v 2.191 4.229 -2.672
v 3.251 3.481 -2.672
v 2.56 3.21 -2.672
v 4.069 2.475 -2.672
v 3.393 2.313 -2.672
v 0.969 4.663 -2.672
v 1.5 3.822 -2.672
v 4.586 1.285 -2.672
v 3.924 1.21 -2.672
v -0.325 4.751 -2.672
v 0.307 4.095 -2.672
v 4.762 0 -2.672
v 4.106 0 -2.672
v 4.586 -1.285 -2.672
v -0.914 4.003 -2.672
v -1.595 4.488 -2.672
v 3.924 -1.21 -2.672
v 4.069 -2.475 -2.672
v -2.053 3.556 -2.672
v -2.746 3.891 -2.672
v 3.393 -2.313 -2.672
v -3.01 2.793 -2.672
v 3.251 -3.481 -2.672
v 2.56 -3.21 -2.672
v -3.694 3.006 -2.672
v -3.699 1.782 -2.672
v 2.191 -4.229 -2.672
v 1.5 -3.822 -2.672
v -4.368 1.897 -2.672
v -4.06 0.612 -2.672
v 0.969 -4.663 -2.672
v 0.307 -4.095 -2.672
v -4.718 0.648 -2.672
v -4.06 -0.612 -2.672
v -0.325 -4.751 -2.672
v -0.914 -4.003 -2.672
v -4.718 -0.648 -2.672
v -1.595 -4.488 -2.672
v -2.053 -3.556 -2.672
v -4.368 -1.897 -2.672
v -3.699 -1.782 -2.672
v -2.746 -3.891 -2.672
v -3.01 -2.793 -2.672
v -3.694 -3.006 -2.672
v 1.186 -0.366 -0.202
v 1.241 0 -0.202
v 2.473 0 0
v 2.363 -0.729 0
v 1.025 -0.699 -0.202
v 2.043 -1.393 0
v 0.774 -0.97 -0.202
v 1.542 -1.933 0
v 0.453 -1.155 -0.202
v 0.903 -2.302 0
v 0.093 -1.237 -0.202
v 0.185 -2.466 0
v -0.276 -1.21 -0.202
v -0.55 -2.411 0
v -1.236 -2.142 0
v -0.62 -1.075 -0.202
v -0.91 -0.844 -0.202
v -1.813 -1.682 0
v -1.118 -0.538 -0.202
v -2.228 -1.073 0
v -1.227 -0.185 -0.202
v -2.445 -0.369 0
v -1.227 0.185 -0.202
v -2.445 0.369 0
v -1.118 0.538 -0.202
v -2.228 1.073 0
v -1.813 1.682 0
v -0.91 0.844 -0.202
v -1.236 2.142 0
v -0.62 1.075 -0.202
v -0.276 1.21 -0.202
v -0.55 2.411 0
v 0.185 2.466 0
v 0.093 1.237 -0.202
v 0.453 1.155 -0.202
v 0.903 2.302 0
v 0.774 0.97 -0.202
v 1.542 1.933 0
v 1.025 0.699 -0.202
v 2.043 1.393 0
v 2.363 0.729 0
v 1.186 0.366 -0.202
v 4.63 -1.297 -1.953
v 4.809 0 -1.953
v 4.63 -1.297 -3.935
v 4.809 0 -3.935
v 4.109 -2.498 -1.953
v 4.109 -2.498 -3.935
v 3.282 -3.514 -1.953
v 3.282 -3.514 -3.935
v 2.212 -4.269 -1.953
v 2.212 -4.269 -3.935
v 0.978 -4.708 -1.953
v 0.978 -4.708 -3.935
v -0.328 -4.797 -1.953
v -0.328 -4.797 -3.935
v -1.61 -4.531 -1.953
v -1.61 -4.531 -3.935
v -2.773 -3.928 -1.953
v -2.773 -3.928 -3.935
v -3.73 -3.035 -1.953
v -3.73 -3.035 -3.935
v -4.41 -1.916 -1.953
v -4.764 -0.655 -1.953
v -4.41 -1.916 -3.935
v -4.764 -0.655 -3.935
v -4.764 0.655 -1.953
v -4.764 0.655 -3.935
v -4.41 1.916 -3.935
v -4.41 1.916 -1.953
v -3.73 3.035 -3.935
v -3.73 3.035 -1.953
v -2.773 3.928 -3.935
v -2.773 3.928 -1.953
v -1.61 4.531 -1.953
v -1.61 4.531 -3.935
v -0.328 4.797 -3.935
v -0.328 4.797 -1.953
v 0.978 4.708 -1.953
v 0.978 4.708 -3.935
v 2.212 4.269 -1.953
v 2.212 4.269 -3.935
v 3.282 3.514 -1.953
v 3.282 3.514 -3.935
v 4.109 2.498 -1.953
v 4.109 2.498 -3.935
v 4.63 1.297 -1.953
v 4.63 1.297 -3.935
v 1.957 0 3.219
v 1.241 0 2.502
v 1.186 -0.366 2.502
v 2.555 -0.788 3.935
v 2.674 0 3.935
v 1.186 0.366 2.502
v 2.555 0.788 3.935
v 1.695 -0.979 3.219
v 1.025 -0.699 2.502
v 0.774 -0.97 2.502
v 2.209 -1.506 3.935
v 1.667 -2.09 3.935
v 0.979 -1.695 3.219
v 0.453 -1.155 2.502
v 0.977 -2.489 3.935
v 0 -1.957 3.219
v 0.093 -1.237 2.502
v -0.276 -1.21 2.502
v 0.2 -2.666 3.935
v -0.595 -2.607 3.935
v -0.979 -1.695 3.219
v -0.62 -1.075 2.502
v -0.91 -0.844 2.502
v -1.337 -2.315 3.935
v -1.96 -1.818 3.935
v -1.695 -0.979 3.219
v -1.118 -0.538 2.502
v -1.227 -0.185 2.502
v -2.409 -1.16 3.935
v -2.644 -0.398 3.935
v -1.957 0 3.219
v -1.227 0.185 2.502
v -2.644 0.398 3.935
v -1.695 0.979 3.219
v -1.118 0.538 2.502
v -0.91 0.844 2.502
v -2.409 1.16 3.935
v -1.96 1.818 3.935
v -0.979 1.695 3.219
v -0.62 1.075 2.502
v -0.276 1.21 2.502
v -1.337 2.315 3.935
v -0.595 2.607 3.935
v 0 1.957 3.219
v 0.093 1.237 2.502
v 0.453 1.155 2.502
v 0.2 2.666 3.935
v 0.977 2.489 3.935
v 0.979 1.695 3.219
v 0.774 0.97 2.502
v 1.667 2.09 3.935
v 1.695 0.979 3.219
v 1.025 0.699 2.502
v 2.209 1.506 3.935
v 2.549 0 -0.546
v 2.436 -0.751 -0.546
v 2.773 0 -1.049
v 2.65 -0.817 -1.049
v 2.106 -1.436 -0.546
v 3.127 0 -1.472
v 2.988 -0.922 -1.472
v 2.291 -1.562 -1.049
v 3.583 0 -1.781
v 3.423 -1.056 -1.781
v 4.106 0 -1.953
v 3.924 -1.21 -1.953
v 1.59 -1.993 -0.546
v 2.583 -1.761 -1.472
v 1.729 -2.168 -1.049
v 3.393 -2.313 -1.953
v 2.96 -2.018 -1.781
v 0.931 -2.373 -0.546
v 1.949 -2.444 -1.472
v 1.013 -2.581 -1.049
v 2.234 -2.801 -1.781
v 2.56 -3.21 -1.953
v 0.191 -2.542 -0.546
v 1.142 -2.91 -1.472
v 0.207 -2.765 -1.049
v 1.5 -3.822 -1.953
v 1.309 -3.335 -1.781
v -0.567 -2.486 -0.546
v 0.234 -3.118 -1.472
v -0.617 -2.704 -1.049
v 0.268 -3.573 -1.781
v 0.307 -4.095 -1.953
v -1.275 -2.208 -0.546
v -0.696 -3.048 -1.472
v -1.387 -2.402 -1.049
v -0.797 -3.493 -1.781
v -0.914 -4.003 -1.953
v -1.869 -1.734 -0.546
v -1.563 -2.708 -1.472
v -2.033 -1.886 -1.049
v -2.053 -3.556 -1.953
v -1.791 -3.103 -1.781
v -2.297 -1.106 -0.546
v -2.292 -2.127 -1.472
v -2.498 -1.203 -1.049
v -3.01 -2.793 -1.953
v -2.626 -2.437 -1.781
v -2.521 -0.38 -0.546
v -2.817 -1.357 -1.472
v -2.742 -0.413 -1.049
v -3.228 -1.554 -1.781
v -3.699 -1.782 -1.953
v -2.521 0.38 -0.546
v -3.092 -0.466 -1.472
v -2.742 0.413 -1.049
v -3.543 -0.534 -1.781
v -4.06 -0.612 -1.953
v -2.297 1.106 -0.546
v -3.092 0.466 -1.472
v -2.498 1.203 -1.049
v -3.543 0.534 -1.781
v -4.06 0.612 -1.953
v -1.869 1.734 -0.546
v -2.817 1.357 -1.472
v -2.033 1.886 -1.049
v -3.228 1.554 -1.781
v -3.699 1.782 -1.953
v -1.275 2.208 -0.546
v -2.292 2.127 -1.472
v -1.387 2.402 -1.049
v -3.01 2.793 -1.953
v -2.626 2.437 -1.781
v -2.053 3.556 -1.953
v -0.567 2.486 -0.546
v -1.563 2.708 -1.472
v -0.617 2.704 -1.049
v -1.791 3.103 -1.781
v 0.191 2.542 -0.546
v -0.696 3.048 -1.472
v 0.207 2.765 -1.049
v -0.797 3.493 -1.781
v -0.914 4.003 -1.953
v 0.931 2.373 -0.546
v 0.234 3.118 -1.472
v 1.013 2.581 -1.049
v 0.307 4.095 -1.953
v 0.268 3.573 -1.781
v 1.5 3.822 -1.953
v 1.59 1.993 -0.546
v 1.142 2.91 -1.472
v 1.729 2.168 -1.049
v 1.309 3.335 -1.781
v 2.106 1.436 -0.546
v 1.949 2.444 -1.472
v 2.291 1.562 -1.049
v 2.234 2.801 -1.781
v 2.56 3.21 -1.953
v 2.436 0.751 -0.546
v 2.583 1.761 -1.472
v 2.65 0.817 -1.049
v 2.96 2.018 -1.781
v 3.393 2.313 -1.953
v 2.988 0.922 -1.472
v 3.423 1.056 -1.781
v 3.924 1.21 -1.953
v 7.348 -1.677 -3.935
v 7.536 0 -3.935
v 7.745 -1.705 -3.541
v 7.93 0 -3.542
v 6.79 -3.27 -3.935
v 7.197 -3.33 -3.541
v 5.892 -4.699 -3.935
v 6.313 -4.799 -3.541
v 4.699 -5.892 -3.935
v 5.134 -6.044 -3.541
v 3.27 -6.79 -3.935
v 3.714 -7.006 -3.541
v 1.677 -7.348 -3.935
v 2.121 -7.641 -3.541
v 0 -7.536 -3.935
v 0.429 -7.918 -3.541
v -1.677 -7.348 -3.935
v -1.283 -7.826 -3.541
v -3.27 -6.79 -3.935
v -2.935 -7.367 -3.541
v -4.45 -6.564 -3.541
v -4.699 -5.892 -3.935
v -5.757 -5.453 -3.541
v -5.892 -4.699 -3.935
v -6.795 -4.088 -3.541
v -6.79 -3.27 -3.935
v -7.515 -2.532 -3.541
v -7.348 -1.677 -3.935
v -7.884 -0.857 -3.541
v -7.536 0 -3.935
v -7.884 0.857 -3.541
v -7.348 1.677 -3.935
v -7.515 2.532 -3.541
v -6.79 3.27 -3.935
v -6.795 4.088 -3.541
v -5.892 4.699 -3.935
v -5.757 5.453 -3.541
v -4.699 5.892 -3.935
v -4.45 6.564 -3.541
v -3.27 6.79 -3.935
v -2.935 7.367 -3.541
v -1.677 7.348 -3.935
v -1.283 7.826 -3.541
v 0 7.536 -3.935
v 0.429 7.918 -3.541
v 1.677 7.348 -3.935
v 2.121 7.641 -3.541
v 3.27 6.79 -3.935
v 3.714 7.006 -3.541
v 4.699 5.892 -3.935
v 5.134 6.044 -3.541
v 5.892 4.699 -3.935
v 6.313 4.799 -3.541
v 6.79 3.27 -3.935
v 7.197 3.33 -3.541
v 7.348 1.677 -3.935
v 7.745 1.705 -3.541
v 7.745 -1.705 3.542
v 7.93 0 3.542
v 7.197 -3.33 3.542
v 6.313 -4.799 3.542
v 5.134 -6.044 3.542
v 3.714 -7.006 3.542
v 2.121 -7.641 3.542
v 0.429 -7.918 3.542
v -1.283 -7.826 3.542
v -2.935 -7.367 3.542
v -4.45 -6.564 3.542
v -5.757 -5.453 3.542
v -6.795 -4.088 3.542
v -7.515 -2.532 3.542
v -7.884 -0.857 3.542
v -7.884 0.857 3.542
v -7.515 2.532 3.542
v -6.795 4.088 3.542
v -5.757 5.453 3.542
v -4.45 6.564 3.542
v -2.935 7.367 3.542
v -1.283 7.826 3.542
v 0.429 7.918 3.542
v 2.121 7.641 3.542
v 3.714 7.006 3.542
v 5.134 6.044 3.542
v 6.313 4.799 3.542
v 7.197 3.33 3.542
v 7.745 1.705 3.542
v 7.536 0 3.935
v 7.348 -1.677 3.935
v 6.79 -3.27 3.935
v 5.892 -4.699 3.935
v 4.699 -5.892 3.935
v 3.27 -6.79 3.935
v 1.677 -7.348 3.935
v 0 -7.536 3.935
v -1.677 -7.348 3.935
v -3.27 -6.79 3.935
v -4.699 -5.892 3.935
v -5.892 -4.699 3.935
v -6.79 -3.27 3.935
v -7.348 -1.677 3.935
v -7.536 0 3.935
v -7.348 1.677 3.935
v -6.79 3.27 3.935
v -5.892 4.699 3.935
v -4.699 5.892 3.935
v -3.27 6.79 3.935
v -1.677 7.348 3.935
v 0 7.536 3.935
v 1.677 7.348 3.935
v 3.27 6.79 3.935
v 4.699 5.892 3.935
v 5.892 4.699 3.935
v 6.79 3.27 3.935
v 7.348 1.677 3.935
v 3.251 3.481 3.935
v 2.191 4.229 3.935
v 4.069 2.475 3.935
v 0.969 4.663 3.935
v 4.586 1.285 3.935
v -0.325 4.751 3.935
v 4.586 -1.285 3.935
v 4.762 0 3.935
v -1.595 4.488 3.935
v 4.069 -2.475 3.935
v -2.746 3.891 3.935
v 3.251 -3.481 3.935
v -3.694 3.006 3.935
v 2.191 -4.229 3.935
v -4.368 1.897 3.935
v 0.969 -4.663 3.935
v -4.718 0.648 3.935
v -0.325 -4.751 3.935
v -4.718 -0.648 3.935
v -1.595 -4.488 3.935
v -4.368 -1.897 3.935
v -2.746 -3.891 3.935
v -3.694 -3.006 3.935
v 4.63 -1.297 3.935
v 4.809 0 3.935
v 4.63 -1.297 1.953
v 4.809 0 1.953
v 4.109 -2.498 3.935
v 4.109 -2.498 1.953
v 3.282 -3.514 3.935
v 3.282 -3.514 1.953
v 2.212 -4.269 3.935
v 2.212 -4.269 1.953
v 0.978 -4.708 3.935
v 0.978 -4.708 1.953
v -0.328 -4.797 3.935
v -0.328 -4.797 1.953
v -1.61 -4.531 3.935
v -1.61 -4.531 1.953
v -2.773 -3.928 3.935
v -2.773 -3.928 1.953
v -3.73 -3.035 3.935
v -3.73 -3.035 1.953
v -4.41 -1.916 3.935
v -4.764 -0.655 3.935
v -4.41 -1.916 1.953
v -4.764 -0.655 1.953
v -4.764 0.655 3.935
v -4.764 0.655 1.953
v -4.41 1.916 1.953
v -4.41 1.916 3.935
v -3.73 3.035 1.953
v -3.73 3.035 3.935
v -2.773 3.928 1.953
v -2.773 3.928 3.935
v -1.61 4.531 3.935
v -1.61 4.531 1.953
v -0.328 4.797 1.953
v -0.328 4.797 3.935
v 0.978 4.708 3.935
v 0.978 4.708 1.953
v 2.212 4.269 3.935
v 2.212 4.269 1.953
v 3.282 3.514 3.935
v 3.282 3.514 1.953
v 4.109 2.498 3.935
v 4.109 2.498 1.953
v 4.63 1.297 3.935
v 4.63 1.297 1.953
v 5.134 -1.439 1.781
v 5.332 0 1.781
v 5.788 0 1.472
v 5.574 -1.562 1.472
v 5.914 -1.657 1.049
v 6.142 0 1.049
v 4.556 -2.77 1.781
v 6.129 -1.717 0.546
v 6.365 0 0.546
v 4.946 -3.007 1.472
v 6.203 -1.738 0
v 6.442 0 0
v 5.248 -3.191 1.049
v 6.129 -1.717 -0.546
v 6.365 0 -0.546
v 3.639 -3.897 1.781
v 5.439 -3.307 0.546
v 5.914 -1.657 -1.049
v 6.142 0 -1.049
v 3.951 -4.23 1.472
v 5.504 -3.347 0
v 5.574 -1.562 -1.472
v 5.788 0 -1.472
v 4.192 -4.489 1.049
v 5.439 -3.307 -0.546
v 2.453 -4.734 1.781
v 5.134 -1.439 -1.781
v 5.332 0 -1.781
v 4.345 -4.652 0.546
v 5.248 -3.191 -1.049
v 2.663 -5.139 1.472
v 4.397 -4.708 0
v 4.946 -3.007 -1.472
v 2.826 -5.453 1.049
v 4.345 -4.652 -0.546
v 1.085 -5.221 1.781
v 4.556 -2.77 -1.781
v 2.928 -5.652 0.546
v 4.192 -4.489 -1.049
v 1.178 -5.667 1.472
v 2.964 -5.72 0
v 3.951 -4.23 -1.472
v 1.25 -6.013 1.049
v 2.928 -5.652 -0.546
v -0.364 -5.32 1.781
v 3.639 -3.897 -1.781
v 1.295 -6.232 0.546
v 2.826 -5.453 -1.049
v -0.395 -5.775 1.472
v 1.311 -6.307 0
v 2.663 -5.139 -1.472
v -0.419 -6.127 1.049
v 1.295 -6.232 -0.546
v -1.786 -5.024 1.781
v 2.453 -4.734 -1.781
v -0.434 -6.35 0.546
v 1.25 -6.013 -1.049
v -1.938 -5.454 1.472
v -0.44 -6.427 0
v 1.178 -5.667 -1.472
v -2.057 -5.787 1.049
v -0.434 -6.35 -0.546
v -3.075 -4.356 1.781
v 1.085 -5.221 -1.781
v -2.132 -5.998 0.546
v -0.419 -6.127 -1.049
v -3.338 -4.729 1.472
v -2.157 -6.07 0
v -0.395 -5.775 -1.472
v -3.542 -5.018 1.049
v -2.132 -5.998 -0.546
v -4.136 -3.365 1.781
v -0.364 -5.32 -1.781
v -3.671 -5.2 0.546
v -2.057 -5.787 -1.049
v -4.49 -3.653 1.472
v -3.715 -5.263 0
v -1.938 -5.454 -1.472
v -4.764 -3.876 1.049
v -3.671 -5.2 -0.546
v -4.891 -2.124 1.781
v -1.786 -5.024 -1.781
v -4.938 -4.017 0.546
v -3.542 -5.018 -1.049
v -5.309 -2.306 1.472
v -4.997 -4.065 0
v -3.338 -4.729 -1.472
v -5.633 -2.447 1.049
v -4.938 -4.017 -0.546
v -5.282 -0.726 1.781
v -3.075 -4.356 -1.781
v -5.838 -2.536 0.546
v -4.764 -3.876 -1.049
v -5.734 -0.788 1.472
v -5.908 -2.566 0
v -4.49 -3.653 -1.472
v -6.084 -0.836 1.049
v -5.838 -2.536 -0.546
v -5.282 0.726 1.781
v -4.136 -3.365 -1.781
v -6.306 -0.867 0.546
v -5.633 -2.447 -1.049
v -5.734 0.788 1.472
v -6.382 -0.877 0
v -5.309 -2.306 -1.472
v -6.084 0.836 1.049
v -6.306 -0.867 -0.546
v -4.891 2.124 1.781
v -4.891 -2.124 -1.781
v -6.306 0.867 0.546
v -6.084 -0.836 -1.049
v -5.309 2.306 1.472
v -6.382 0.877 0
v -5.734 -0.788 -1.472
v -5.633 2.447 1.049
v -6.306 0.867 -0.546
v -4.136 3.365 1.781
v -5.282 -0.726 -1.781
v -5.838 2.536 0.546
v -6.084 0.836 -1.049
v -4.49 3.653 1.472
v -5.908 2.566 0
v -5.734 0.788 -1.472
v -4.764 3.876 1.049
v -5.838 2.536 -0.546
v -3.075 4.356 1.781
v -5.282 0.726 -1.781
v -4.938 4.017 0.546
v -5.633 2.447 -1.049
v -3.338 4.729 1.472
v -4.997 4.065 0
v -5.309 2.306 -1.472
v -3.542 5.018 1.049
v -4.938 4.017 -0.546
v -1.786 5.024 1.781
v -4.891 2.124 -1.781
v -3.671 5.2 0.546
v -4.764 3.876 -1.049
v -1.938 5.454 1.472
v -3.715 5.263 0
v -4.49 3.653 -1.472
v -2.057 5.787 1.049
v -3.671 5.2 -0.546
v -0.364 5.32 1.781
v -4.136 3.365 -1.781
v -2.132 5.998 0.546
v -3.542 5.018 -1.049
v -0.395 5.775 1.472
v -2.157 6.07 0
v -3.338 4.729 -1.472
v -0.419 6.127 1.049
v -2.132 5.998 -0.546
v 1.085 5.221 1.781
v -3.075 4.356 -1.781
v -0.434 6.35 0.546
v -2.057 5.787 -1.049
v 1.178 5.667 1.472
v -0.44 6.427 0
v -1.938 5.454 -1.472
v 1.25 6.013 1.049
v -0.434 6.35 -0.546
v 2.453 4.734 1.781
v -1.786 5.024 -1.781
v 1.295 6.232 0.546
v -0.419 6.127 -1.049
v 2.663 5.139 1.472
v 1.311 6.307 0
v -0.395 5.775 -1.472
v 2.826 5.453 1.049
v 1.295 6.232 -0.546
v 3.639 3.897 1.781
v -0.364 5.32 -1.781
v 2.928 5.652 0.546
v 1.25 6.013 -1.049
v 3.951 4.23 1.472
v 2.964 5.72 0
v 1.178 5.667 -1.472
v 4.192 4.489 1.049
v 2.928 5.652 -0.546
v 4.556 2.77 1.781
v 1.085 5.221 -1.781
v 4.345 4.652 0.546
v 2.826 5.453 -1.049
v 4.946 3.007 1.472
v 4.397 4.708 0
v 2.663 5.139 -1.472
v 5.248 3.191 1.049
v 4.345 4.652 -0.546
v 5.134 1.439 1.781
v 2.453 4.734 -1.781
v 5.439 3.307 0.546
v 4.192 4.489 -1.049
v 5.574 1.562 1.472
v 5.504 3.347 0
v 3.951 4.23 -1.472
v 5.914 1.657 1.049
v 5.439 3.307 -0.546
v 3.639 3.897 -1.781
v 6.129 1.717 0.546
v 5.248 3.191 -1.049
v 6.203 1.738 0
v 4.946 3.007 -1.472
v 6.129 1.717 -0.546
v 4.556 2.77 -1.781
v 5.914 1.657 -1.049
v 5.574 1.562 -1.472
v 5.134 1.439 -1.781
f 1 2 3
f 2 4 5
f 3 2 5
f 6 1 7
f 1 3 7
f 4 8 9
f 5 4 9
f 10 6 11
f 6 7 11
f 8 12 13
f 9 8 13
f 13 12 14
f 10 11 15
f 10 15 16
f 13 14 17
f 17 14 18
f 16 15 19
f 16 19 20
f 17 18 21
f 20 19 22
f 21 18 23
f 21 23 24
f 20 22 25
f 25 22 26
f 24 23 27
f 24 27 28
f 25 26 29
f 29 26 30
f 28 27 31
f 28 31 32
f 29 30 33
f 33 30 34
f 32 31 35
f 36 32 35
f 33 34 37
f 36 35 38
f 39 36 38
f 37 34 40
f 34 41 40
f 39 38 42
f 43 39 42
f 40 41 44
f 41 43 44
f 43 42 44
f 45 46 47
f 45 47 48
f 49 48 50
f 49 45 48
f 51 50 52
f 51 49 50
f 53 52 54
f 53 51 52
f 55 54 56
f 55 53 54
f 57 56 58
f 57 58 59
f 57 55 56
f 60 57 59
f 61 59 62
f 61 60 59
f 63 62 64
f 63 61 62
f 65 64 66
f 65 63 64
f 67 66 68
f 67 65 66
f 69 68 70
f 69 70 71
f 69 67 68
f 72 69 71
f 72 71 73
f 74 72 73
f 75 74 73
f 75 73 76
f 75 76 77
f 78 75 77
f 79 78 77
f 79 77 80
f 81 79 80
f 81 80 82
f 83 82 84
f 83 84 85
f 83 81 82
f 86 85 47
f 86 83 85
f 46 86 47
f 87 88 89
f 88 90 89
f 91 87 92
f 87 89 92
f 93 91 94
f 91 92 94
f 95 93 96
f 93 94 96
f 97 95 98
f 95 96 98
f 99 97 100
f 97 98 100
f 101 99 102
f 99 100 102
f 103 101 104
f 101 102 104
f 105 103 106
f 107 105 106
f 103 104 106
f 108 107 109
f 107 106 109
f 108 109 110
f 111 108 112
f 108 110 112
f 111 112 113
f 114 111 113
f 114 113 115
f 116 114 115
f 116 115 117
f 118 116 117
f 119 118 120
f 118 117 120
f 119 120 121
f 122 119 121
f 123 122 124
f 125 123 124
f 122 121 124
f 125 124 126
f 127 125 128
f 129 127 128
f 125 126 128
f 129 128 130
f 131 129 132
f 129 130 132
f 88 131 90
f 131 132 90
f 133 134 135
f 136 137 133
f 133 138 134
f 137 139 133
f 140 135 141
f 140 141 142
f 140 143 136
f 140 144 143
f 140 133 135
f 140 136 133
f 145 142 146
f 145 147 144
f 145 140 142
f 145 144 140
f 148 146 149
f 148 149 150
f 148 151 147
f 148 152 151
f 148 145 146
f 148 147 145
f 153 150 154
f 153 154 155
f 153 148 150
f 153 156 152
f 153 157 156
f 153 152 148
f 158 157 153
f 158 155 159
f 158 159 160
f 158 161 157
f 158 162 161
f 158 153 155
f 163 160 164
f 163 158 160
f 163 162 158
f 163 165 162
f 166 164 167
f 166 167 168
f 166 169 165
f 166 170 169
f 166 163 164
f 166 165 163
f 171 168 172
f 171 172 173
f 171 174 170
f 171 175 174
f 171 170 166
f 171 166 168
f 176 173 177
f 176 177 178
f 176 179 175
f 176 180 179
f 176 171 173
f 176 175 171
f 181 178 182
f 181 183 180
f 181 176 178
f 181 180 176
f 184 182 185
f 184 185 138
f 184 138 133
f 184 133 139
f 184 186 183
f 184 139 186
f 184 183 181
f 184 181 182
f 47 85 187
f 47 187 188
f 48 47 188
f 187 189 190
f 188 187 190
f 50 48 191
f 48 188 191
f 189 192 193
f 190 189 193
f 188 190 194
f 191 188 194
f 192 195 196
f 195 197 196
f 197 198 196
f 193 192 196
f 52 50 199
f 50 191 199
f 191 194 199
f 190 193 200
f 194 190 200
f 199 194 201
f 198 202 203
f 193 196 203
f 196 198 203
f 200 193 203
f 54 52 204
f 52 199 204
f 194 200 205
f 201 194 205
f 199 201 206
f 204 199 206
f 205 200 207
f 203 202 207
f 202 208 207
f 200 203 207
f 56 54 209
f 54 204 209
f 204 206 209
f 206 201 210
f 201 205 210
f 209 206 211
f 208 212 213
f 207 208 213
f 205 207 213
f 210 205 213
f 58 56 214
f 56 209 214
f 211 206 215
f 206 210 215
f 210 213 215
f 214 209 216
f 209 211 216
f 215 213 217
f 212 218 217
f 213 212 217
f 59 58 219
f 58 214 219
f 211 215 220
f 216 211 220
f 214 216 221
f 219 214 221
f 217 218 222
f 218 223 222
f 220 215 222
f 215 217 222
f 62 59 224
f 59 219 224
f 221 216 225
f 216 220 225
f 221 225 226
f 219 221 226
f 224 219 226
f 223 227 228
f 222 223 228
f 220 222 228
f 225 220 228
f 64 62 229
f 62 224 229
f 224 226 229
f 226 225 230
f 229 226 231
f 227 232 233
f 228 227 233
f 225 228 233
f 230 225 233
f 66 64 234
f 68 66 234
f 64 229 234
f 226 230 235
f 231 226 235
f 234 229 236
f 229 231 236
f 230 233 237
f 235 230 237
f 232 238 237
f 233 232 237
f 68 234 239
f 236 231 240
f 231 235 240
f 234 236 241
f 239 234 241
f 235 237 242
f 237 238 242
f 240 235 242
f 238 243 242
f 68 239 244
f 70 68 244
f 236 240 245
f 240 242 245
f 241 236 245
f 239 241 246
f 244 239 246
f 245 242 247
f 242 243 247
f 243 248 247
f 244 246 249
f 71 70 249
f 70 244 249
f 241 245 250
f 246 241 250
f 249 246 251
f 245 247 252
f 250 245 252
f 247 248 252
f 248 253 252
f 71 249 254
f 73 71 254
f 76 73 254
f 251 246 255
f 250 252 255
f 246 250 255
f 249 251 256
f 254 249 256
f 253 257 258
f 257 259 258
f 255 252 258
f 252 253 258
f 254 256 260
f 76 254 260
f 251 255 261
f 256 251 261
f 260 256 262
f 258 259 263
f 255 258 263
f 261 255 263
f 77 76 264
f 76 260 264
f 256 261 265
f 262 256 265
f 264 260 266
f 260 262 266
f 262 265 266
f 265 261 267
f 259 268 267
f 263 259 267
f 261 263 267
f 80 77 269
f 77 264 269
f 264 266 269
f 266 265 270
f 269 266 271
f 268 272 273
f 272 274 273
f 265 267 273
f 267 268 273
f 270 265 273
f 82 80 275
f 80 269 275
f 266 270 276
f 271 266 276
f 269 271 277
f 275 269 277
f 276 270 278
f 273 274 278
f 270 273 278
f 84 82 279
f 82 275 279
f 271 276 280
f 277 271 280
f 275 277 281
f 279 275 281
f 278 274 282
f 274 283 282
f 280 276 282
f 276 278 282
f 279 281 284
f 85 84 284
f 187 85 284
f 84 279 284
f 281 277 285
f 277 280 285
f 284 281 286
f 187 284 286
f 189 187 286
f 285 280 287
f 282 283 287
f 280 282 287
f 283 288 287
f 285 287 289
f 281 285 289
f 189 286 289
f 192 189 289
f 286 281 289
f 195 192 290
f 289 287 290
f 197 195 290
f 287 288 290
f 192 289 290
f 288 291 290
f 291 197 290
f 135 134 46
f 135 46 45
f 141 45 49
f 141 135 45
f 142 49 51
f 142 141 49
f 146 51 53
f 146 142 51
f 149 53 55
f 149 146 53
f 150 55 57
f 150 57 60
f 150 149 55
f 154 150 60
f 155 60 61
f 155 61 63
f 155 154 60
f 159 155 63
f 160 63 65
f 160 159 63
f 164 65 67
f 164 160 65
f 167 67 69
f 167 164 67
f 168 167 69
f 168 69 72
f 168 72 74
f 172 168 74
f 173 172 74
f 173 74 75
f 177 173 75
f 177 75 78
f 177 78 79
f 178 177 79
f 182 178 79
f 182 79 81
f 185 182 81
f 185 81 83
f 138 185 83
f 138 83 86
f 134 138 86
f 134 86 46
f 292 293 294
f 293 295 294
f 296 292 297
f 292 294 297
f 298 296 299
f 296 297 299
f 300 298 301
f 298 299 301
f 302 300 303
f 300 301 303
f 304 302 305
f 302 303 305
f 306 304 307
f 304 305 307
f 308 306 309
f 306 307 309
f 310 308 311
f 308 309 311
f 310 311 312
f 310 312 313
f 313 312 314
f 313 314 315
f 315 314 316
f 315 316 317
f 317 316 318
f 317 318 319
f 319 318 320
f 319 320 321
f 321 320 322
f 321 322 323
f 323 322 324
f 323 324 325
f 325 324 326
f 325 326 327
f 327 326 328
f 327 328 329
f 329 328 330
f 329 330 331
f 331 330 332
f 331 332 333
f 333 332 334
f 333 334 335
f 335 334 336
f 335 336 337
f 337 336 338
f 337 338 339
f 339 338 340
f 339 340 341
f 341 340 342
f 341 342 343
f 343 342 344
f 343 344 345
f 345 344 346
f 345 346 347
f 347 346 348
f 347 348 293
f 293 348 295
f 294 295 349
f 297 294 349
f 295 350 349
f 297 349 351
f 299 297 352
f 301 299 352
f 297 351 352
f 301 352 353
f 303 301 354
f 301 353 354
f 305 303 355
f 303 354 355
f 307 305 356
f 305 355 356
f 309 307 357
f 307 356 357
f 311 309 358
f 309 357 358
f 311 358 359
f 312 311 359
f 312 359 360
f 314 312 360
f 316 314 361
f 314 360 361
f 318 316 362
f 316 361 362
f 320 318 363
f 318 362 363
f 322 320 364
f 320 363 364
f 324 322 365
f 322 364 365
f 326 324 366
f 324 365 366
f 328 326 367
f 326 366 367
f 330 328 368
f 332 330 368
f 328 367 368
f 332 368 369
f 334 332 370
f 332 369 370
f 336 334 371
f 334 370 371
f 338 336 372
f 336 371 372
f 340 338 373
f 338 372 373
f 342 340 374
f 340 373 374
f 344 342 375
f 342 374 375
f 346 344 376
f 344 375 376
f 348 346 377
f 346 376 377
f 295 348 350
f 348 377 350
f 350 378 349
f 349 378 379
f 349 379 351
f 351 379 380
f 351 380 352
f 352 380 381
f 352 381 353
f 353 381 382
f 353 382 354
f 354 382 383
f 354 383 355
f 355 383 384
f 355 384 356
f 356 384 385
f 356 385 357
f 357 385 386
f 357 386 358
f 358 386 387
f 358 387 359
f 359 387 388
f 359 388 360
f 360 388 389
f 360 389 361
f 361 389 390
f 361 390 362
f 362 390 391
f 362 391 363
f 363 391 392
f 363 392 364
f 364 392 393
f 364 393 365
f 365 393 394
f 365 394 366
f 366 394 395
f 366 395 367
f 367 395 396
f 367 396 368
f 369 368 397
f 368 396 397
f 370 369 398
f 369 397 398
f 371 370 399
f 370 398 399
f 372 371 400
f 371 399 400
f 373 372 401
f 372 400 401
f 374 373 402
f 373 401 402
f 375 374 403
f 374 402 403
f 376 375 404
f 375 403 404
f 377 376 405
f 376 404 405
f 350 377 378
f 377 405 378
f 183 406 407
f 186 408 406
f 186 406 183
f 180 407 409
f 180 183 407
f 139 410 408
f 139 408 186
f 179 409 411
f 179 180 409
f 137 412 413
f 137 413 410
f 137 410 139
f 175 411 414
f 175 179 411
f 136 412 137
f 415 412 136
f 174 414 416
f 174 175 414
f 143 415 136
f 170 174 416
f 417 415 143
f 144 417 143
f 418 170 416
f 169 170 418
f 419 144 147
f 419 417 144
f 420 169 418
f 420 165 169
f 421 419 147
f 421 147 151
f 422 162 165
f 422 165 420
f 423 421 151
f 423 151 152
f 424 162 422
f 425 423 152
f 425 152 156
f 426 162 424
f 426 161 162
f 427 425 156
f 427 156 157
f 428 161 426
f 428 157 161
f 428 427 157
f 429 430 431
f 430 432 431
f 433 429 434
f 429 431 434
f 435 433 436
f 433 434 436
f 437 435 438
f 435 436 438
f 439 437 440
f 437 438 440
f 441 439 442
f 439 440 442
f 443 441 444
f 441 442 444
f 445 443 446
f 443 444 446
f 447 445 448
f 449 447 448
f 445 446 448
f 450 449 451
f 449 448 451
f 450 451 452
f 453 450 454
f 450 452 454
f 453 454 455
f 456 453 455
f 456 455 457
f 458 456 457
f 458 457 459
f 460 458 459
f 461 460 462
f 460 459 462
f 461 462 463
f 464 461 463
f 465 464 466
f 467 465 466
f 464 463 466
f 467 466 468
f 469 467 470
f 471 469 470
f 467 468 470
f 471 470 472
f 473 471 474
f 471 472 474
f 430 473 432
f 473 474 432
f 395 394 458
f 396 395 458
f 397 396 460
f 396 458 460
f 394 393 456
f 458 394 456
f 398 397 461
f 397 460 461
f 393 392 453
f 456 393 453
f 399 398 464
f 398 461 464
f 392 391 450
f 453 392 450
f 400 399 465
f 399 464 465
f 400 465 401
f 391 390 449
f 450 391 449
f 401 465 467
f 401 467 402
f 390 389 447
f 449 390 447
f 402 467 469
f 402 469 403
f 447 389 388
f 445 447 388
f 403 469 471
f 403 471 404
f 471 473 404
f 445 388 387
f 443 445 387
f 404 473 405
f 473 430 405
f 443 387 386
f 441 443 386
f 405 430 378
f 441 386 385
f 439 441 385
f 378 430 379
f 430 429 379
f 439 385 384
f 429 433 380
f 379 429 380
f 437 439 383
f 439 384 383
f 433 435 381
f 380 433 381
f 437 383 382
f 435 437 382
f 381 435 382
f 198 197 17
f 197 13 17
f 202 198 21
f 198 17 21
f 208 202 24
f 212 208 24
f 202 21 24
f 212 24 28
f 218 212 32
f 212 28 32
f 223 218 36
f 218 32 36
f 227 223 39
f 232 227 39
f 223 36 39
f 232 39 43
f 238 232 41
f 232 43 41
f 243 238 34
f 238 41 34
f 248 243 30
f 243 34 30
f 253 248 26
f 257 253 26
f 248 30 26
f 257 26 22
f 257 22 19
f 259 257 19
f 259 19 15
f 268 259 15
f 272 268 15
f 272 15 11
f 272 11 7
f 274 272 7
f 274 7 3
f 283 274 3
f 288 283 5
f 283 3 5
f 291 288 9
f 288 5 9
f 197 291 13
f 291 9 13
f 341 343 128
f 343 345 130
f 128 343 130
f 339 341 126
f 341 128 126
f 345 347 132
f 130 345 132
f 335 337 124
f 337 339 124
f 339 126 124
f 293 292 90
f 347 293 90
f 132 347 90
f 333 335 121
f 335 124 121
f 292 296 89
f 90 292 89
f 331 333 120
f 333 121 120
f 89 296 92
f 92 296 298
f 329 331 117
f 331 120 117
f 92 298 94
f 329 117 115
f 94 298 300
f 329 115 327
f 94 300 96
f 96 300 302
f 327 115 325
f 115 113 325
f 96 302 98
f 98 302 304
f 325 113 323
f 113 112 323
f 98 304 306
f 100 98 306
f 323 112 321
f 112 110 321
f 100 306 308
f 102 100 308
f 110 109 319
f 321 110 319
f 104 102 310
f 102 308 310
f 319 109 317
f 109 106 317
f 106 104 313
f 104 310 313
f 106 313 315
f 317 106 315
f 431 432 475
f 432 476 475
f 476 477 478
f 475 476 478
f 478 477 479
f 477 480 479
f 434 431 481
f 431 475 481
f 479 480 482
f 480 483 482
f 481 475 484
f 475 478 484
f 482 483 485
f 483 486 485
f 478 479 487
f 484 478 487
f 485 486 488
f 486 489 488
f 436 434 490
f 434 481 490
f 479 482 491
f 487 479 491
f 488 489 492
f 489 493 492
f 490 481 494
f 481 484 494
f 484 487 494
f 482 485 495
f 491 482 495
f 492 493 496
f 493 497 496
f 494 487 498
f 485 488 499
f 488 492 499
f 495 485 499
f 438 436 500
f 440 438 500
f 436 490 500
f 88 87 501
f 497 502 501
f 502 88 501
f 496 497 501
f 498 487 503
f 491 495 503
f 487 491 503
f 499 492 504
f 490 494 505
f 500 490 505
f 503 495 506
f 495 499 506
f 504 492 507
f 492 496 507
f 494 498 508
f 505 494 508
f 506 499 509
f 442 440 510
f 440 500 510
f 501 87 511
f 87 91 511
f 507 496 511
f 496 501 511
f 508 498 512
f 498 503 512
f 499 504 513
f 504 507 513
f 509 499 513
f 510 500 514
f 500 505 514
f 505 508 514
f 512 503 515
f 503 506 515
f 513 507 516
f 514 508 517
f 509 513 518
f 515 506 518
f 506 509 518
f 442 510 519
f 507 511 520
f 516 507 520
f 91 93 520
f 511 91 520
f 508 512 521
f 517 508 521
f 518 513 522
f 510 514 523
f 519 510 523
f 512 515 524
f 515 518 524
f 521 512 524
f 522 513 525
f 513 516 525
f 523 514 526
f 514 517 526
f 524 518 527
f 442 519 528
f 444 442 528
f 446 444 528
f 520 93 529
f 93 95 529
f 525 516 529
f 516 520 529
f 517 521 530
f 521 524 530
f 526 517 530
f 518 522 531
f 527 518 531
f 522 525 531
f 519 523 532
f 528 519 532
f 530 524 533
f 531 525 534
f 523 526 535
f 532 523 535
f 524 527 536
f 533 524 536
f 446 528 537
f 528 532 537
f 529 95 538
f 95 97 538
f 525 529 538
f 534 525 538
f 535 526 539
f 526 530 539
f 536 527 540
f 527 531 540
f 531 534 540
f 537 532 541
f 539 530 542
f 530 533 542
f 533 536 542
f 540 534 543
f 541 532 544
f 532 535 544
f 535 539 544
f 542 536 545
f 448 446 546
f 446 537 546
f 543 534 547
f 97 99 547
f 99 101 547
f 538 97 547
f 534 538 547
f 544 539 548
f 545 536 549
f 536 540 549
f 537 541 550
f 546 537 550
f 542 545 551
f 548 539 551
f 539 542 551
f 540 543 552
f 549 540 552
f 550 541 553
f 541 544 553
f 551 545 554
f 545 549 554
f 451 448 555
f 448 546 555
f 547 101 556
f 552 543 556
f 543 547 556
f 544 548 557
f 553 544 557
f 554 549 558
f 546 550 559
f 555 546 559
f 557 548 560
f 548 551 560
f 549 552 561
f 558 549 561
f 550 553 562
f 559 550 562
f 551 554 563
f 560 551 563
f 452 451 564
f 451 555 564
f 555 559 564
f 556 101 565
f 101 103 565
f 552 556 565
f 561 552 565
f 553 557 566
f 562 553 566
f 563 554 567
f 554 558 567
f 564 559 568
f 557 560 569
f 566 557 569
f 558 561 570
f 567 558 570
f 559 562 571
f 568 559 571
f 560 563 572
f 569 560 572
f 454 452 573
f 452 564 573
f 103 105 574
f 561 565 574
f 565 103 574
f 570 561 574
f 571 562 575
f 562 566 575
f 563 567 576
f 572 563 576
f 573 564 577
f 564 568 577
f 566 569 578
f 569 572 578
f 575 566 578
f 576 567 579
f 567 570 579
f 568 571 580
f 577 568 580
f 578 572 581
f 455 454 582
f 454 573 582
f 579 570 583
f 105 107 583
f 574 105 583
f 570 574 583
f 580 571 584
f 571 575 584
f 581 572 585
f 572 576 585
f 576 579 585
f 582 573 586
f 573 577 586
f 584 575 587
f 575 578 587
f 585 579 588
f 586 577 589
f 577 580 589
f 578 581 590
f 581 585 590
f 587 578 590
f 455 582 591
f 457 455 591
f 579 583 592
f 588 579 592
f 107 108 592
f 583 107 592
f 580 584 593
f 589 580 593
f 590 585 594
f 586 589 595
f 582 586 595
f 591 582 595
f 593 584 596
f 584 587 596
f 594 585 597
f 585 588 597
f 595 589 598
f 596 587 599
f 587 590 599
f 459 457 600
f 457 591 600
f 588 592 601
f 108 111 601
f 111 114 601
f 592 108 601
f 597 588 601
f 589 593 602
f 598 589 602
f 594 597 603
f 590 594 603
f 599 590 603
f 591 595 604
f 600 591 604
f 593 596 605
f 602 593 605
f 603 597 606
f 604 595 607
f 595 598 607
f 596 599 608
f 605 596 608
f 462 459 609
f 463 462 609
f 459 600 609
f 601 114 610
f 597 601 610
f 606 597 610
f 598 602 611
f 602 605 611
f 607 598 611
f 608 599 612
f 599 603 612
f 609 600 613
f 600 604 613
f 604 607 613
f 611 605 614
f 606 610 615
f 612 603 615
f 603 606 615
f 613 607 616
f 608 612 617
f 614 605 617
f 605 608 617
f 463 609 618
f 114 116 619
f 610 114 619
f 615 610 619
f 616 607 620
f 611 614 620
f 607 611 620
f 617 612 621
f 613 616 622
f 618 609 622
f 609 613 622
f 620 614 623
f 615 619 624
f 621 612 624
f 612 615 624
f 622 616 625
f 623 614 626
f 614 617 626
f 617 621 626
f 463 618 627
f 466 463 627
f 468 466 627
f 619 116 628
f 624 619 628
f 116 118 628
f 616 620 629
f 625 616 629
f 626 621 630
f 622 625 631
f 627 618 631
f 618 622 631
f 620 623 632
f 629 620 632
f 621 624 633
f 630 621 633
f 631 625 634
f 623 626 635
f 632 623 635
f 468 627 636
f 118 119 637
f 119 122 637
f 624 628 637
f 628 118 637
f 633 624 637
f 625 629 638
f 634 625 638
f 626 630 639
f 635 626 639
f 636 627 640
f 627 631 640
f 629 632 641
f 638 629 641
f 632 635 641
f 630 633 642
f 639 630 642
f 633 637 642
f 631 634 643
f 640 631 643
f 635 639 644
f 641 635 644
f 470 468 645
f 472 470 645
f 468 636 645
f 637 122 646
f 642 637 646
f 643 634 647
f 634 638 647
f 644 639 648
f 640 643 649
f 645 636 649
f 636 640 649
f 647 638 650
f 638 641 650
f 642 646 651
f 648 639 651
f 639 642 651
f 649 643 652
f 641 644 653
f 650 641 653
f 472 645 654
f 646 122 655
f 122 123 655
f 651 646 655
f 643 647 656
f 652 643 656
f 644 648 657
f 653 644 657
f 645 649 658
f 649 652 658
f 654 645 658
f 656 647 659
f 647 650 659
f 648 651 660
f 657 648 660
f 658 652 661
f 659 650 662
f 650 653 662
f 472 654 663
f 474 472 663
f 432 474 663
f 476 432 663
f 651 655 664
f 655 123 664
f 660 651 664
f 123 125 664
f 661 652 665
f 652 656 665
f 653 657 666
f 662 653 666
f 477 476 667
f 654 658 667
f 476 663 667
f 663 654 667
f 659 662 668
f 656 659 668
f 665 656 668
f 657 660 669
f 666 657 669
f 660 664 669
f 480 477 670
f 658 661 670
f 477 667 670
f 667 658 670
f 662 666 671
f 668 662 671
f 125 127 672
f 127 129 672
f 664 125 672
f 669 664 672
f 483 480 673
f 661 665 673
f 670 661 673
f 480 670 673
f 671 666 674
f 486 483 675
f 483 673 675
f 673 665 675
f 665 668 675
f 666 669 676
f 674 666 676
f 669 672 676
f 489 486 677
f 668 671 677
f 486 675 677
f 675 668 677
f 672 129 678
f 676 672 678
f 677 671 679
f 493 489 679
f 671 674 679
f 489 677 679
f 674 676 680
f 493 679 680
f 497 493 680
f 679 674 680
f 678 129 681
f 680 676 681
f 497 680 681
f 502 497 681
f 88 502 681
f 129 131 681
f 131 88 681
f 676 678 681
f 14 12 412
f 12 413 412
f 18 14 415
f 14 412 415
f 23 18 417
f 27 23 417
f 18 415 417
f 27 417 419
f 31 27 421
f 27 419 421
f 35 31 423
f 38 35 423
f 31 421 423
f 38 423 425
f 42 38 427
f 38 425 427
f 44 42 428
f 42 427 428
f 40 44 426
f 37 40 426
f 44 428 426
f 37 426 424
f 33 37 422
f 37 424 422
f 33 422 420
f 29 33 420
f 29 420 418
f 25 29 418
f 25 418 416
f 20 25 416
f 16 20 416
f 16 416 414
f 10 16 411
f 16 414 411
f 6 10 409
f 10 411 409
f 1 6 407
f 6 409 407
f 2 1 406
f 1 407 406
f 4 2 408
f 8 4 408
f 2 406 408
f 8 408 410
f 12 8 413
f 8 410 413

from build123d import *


with BuildPart() as part:
    # Sketch1 → Revolve1 (revolve)
    with BuildSketch(Plane(origin=(0, 0, 0), x_dir=(0, 0, -1), z_dir=(1, 0, 0))):
        with BuildLine():
            Line((3.5415, 7.93), (-3.5415, 7.93))
            Line((-3.5415, 7.93), (-3.935, 7.5365))
            Line((-3.935, 7.5365), (-3.935, 4.808552541))
            Line((-3.935, 4.808552541), (-1.953048009, 4.808552541))
            ThreePointArc((-1.953048009, 4.808552541), (0, 6.44171875), (1.953048009, 4.808552541))
            Line((1.953048009, 4.808552541), (3.935, 4.808552541))
            Line((3.935, 4.808552541), (3.935, 7.5365))
            Line((3.935, 7.5365), (3.5415, 7.93))
        make_face()
    revolve(axis=Axis((0, 0, 3.935), (0, 0, -1)))


with BuildPart() as body_2:
    # Sketch2 → Revolve2 (revolve)
    with BuildSketch(Plane(origin=(0, 0, 0), x_dir=(0, 0, -1), z_dir=(1, 0, 0))):
        with BuildLine():
            Line((-3.935, 4.106134959), (-1.953048009, 4.106134959))
            ThreePointArc((-1.953048009, 4.106134959), (-1.272952119, 2.935063538), (0, 2.47296875))
            Line((0, 2.47296875), (0.201578428, 1.240960969))
            Line((0.201578428, 1.240960969), (-2.502413005, 1.240960969))
            Line((-2.502413005, 1.240960969), (-3.935, 2.673547964))
            Line((-3.935, 2.673547964), (-3.935, 4.106134959))
        make_face()
    revolve(axis=Axis((0, 0, 3.935), (0, 0, -1)))

    # Sketch3 → Revolve3 (revolve)
    with BuildSketch(Plane(origin=(0, 0, 0), x_dir=(0, 0, -1), z_dir=(1, 0, 0))):
        with BuildLine():
            Line((-3.935, 2.673547964), (-2.502413005, 1.240960969))
            Line((-2.502413005, 1.240960969), (0, 1.240960969))
            Line((0, 1.240960969), (0, 2.47296875))
            ThreePointArc((0, 2.47296875), (1.272952119, 2.935063538), (1.953048009, 4.106134959))
            Line((1.953048009, 4.106134959), (2.672363855, 4.106134959))
            Line((2.672363855, 4.106134959), (2.672363855, 4.7625))
            Line((2.672363855, 4.7625), (-3.935, 4.7625))
            Line((-3.935, 4.7625), (-3.935, 2.673547964))
        make_face()
    revolve(axis=Axis((0, 0, 3.935), (0, 0, -1)))


solid = Compound([part.part, body_2.part])
